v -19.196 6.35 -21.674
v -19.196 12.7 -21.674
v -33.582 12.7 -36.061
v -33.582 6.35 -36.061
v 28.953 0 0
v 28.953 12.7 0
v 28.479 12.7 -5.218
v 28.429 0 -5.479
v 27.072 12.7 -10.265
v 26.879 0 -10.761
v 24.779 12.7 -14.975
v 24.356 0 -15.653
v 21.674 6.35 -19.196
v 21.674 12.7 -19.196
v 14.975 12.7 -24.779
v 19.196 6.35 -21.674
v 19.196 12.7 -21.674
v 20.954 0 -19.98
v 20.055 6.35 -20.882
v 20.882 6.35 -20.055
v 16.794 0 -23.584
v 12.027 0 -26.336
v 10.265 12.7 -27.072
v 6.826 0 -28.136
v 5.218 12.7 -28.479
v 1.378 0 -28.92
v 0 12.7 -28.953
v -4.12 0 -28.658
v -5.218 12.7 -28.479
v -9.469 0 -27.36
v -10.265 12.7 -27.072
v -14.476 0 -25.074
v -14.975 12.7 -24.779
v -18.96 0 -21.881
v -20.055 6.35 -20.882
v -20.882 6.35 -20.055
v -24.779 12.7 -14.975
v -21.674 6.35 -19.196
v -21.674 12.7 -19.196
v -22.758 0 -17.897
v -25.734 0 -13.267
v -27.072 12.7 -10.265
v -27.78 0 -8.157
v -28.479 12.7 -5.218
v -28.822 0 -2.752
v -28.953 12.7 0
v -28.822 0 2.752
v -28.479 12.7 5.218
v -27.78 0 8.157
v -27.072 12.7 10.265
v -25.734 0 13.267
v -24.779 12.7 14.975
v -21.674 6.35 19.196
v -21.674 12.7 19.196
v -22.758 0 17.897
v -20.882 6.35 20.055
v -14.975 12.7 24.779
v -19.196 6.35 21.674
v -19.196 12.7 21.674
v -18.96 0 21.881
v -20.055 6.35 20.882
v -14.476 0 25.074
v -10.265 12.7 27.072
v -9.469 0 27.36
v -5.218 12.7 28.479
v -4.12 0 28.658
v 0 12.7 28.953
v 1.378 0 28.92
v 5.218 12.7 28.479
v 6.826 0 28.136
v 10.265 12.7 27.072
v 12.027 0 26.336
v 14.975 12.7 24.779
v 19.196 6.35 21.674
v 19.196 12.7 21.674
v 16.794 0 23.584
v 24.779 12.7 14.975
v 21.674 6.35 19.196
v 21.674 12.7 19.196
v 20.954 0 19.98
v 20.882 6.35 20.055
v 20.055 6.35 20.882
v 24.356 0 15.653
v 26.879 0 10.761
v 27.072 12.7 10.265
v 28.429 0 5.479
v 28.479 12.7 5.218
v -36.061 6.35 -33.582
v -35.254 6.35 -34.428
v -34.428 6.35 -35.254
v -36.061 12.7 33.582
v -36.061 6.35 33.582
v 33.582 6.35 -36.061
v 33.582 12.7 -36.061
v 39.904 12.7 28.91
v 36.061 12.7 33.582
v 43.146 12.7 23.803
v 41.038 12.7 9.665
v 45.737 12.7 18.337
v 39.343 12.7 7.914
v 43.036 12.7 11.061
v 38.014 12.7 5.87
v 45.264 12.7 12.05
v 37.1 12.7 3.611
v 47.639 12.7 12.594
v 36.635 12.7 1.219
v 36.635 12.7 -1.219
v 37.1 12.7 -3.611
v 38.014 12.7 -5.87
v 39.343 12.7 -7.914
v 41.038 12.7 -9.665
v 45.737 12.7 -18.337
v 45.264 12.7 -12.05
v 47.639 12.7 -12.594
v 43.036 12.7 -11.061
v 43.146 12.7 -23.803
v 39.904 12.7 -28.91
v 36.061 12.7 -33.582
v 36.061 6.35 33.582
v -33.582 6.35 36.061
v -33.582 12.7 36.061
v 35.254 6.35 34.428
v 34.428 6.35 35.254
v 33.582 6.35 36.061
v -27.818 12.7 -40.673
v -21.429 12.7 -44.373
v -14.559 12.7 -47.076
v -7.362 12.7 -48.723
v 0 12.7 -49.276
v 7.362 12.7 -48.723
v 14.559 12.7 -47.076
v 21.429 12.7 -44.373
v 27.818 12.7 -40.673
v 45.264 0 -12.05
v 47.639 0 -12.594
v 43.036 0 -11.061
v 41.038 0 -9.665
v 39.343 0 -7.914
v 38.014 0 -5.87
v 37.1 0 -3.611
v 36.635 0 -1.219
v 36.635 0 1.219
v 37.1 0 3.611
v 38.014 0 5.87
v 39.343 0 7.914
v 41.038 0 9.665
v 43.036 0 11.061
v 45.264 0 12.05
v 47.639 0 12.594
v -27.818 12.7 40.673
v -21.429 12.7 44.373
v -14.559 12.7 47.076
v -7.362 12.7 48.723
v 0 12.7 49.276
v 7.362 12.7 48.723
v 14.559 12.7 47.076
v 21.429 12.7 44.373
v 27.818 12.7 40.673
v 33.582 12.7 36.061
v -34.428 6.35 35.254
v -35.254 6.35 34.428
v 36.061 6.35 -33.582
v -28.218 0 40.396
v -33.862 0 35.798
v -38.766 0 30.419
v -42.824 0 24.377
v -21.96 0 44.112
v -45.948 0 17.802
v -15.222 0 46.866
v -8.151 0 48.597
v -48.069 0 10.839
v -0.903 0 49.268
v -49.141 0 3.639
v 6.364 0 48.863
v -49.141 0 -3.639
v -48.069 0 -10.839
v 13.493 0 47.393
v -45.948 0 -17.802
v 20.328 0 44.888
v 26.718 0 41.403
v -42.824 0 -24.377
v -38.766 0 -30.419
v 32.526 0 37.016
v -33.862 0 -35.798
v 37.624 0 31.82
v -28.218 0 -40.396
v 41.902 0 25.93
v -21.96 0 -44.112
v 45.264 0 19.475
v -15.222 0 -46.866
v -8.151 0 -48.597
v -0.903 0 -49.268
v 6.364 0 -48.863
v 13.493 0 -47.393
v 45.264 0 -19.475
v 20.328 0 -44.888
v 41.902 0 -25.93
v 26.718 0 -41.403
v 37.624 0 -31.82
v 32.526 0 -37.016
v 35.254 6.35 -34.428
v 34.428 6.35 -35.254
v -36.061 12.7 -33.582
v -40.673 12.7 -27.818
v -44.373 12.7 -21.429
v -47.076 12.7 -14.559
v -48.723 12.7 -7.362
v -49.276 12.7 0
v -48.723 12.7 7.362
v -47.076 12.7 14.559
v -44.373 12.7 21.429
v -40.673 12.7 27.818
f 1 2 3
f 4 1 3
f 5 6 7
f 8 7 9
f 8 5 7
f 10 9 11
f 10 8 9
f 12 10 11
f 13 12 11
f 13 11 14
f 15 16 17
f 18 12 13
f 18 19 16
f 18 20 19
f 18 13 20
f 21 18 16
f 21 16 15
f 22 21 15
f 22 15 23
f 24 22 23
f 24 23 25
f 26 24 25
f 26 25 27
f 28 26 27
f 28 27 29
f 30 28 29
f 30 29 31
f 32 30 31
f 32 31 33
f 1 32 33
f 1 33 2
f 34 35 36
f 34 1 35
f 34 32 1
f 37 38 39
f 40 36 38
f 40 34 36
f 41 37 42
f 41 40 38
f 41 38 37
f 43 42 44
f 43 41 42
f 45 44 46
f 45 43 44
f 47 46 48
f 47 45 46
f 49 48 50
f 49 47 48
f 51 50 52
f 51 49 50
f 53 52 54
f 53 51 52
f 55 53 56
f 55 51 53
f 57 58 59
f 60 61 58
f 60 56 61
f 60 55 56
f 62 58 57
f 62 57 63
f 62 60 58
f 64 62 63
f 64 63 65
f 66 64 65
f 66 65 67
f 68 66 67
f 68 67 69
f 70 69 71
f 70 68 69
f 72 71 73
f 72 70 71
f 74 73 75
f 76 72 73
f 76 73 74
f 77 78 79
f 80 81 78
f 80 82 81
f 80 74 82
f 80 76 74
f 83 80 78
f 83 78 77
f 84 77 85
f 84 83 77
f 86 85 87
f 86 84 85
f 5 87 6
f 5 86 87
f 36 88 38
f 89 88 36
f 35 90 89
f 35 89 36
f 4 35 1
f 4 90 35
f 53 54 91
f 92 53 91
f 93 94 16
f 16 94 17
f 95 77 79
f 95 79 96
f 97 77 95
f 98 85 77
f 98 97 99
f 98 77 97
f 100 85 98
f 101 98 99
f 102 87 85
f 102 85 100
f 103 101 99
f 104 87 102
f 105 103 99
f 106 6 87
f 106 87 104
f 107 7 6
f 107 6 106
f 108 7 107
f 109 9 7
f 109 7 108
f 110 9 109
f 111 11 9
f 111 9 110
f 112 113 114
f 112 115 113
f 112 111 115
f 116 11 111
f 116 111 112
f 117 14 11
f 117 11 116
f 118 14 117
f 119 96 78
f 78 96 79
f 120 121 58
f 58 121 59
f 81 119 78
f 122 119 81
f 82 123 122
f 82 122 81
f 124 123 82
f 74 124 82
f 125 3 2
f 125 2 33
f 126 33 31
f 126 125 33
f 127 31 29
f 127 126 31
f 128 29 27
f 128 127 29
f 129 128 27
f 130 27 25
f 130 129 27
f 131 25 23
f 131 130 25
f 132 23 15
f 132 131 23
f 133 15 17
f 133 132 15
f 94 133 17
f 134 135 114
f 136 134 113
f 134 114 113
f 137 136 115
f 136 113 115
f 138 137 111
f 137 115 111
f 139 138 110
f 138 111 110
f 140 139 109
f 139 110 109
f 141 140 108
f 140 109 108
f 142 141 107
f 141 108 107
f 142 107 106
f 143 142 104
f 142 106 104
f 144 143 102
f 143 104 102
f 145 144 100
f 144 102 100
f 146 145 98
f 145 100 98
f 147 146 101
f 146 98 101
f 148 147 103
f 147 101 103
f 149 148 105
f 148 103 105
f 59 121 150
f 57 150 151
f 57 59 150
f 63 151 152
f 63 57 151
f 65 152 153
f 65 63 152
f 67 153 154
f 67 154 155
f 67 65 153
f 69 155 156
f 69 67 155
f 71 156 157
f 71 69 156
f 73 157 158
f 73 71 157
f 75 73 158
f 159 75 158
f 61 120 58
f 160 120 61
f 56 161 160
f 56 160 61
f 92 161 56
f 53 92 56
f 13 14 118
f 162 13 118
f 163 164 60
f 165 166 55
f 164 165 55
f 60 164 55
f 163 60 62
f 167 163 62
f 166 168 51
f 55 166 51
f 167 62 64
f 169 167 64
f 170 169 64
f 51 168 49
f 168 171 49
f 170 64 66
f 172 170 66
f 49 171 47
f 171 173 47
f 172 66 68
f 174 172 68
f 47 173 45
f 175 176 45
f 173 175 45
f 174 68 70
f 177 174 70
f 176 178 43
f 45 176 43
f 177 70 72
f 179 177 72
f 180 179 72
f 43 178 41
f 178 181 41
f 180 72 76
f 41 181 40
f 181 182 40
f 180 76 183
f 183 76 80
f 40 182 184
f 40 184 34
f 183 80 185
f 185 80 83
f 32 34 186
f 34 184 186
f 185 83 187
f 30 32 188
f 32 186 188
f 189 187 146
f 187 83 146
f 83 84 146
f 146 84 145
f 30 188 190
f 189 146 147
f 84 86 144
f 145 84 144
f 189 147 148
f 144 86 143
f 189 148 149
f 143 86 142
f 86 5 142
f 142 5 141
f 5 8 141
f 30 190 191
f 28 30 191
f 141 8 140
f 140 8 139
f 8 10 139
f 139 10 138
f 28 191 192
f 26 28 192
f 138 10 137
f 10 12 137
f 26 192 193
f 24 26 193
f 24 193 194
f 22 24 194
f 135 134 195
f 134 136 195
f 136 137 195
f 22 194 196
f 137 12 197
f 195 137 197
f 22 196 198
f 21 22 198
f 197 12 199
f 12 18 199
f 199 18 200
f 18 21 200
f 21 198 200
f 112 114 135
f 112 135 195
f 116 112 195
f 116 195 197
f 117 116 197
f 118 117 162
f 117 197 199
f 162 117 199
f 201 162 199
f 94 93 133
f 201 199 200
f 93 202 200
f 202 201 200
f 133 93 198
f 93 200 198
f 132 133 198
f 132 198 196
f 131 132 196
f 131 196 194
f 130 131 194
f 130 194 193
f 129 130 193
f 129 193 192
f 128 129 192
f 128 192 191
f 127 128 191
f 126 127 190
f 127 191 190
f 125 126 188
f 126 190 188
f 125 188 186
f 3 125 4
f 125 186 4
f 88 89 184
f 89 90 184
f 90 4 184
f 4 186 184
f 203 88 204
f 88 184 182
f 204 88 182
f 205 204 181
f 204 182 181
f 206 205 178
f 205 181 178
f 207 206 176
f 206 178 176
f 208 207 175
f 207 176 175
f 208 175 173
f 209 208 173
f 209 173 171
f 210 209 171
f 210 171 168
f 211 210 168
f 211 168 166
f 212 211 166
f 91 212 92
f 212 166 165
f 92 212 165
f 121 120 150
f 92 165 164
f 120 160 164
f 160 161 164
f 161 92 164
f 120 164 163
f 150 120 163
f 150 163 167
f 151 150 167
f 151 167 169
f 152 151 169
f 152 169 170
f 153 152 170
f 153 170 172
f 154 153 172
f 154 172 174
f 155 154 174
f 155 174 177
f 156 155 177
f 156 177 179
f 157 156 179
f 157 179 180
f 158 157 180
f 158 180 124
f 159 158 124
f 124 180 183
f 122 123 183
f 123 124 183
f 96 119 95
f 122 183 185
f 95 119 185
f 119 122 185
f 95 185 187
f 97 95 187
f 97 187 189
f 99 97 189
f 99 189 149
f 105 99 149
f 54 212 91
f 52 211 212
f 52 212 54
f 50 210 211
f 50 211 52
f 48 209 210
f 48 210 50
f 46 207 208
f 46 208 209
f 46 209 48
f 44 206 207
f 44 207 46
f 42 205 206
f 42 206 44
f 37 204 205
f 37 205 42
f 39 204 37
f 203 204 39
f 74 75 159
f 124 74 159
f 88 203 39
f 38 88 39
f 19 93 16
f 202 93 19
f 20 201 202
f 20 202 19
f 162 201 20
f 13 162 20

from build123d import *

# Parameters (mm, degrees)
SKETCH1_R           = 49.276
BOSS_EXTRUDE1_DEPTH = 12.7
SKETCH1_10_R        = 28.952599956
CUT_EXTRUDE2_DEPTH  = 13.7
SKETCH2_R           = 12.7
CUT_EXTRUDE3_DEPTH  = 13.7
CUT_EXTRUDE4_DEPTH  = 6.35
CIRPATTERN1_COUNT   = 4


with BuildPart() as part:
    # Sketch1 → Boss-Extrude1 (new body)
    with BuildSketch(Plane(origin=(0, 0, 0), x_dir=(1, 0, 0), z_dir=(0, 1, 0))):
        Circle(SKETCH1_R)
    extrude(amount=BOSS_EXTRUDE1_DEPTH)

    # Sketch1<10> → Cut-Extrude2 (cut, through all)
    with BuildSketch(Plane(origin=(0, 0, 0), x_dir=(1, 0, 0), z_dir=(0, 1, 0))):
        Circle(SKETCH1_10_R)
    extrude(amount=CUT_EXTRUDE2_DEPTH, mode=Mode.SUBTRACT)

    # Sketch2 → Cut-Extrude3 (cut, through all)
    with BuildSketch(Plane(origin=(0, 12.7, 0), x_dir=(1, 0, 0), z_dir=(0, 1, 0))):
        with Locations((49.276, 0)):
            Circle(SKETCH2_R)
    extrude(amount=-CUT_EXTRUDE3_DEPTH, mode=Mode.SUBTRACT)

    # Sketch3 → Cut-Extrude4 (cut)
    with BuildSketch(Plane(origin=(0, 12.7, 0), x_dir=(1, 0, 0), z_dir=(0, 1, 0))):
        with BuildLine():
            ThreePointArc((-33.582072771, 36.060623461), (-34.84339375, 34.84339375), (-36.060623461, 33.582072771))
            Line((-36.060623461, 33.582072771), (-21.674311893, 19.195761203))
            ThreePointArc((-21.674311893, 19.195761203), (-20.472579762, 20.472579762), (-19.195761203, 21.674311893))
            Line((-19.195761203, 21.674311893), (-33.582072771, 36.060623461))
        make_face()
        with BuildLine():
            ThreePointArc((-19.195761203, 21.674311893), (-20.472579762, 20.472579762), (-21.674311893, 19.195761203))
            Line((-21.674311893, 19.195761203), (-19.199787587, 16.721236897))
            Line((-19.199787587, 16.721236897), (-16.721236897, 19.199787587))
            Line((-16.721236897, 19.199787587), (-19.195761203, 21.674311893))
        make_face()
        with BuildLine():
            Line((-19.199787587, 16.721236897), (-21.674311893, 19.195761203))
            ThreePointArc((-21.674311893, 19.195761203), (-10.264632547, -27.071947896), (28.952599956, 0))
            ThreePointArc((28.952599956, 0), (11.884566657, 26.400949218), (-19.195761203, 21.674311893))
            Line((-19.195761203, 21.674311893), (-16.721236897, 19.199787587))
            Line((-16.721236897, 19.199787587), (-19.199787587, 16.721236897))
        make_face()
        with BuildLine():
            Line((-34.897275286, 37.375825976), (-37.375825976, 34.897275286))
            Line((-37.375825976, 34.897275286), (-36.060623461, 33.582072771))
            ThreePointArc((-36.060623461, 33.582072771), (-34.84339375, 34.84339375), (-33.582072771, 36.060623461))
            Line((-33.582072771, 36.060623461), (-34.897275286, 37.375825976))
        make_face()
    cut_extrude4 = extrude(amount=-CUT_EXTRUDE4_DEPTH, mode=Mode.SUBTRACT)

    # CirPattern1: Cut-Extrude4 ×4 about axis
    cirpattern1_axis = Axis((0, 0, 0), (0, 1, 0))
    for i in range(1, CIRPATTERN1_COUNT):
        add(cut_extrude4.rotate(cirpattern1_axis, i * 360 / CIRPATTERN1_COUNT), mode=Mode.SUBTRACT)


solid = part.part
